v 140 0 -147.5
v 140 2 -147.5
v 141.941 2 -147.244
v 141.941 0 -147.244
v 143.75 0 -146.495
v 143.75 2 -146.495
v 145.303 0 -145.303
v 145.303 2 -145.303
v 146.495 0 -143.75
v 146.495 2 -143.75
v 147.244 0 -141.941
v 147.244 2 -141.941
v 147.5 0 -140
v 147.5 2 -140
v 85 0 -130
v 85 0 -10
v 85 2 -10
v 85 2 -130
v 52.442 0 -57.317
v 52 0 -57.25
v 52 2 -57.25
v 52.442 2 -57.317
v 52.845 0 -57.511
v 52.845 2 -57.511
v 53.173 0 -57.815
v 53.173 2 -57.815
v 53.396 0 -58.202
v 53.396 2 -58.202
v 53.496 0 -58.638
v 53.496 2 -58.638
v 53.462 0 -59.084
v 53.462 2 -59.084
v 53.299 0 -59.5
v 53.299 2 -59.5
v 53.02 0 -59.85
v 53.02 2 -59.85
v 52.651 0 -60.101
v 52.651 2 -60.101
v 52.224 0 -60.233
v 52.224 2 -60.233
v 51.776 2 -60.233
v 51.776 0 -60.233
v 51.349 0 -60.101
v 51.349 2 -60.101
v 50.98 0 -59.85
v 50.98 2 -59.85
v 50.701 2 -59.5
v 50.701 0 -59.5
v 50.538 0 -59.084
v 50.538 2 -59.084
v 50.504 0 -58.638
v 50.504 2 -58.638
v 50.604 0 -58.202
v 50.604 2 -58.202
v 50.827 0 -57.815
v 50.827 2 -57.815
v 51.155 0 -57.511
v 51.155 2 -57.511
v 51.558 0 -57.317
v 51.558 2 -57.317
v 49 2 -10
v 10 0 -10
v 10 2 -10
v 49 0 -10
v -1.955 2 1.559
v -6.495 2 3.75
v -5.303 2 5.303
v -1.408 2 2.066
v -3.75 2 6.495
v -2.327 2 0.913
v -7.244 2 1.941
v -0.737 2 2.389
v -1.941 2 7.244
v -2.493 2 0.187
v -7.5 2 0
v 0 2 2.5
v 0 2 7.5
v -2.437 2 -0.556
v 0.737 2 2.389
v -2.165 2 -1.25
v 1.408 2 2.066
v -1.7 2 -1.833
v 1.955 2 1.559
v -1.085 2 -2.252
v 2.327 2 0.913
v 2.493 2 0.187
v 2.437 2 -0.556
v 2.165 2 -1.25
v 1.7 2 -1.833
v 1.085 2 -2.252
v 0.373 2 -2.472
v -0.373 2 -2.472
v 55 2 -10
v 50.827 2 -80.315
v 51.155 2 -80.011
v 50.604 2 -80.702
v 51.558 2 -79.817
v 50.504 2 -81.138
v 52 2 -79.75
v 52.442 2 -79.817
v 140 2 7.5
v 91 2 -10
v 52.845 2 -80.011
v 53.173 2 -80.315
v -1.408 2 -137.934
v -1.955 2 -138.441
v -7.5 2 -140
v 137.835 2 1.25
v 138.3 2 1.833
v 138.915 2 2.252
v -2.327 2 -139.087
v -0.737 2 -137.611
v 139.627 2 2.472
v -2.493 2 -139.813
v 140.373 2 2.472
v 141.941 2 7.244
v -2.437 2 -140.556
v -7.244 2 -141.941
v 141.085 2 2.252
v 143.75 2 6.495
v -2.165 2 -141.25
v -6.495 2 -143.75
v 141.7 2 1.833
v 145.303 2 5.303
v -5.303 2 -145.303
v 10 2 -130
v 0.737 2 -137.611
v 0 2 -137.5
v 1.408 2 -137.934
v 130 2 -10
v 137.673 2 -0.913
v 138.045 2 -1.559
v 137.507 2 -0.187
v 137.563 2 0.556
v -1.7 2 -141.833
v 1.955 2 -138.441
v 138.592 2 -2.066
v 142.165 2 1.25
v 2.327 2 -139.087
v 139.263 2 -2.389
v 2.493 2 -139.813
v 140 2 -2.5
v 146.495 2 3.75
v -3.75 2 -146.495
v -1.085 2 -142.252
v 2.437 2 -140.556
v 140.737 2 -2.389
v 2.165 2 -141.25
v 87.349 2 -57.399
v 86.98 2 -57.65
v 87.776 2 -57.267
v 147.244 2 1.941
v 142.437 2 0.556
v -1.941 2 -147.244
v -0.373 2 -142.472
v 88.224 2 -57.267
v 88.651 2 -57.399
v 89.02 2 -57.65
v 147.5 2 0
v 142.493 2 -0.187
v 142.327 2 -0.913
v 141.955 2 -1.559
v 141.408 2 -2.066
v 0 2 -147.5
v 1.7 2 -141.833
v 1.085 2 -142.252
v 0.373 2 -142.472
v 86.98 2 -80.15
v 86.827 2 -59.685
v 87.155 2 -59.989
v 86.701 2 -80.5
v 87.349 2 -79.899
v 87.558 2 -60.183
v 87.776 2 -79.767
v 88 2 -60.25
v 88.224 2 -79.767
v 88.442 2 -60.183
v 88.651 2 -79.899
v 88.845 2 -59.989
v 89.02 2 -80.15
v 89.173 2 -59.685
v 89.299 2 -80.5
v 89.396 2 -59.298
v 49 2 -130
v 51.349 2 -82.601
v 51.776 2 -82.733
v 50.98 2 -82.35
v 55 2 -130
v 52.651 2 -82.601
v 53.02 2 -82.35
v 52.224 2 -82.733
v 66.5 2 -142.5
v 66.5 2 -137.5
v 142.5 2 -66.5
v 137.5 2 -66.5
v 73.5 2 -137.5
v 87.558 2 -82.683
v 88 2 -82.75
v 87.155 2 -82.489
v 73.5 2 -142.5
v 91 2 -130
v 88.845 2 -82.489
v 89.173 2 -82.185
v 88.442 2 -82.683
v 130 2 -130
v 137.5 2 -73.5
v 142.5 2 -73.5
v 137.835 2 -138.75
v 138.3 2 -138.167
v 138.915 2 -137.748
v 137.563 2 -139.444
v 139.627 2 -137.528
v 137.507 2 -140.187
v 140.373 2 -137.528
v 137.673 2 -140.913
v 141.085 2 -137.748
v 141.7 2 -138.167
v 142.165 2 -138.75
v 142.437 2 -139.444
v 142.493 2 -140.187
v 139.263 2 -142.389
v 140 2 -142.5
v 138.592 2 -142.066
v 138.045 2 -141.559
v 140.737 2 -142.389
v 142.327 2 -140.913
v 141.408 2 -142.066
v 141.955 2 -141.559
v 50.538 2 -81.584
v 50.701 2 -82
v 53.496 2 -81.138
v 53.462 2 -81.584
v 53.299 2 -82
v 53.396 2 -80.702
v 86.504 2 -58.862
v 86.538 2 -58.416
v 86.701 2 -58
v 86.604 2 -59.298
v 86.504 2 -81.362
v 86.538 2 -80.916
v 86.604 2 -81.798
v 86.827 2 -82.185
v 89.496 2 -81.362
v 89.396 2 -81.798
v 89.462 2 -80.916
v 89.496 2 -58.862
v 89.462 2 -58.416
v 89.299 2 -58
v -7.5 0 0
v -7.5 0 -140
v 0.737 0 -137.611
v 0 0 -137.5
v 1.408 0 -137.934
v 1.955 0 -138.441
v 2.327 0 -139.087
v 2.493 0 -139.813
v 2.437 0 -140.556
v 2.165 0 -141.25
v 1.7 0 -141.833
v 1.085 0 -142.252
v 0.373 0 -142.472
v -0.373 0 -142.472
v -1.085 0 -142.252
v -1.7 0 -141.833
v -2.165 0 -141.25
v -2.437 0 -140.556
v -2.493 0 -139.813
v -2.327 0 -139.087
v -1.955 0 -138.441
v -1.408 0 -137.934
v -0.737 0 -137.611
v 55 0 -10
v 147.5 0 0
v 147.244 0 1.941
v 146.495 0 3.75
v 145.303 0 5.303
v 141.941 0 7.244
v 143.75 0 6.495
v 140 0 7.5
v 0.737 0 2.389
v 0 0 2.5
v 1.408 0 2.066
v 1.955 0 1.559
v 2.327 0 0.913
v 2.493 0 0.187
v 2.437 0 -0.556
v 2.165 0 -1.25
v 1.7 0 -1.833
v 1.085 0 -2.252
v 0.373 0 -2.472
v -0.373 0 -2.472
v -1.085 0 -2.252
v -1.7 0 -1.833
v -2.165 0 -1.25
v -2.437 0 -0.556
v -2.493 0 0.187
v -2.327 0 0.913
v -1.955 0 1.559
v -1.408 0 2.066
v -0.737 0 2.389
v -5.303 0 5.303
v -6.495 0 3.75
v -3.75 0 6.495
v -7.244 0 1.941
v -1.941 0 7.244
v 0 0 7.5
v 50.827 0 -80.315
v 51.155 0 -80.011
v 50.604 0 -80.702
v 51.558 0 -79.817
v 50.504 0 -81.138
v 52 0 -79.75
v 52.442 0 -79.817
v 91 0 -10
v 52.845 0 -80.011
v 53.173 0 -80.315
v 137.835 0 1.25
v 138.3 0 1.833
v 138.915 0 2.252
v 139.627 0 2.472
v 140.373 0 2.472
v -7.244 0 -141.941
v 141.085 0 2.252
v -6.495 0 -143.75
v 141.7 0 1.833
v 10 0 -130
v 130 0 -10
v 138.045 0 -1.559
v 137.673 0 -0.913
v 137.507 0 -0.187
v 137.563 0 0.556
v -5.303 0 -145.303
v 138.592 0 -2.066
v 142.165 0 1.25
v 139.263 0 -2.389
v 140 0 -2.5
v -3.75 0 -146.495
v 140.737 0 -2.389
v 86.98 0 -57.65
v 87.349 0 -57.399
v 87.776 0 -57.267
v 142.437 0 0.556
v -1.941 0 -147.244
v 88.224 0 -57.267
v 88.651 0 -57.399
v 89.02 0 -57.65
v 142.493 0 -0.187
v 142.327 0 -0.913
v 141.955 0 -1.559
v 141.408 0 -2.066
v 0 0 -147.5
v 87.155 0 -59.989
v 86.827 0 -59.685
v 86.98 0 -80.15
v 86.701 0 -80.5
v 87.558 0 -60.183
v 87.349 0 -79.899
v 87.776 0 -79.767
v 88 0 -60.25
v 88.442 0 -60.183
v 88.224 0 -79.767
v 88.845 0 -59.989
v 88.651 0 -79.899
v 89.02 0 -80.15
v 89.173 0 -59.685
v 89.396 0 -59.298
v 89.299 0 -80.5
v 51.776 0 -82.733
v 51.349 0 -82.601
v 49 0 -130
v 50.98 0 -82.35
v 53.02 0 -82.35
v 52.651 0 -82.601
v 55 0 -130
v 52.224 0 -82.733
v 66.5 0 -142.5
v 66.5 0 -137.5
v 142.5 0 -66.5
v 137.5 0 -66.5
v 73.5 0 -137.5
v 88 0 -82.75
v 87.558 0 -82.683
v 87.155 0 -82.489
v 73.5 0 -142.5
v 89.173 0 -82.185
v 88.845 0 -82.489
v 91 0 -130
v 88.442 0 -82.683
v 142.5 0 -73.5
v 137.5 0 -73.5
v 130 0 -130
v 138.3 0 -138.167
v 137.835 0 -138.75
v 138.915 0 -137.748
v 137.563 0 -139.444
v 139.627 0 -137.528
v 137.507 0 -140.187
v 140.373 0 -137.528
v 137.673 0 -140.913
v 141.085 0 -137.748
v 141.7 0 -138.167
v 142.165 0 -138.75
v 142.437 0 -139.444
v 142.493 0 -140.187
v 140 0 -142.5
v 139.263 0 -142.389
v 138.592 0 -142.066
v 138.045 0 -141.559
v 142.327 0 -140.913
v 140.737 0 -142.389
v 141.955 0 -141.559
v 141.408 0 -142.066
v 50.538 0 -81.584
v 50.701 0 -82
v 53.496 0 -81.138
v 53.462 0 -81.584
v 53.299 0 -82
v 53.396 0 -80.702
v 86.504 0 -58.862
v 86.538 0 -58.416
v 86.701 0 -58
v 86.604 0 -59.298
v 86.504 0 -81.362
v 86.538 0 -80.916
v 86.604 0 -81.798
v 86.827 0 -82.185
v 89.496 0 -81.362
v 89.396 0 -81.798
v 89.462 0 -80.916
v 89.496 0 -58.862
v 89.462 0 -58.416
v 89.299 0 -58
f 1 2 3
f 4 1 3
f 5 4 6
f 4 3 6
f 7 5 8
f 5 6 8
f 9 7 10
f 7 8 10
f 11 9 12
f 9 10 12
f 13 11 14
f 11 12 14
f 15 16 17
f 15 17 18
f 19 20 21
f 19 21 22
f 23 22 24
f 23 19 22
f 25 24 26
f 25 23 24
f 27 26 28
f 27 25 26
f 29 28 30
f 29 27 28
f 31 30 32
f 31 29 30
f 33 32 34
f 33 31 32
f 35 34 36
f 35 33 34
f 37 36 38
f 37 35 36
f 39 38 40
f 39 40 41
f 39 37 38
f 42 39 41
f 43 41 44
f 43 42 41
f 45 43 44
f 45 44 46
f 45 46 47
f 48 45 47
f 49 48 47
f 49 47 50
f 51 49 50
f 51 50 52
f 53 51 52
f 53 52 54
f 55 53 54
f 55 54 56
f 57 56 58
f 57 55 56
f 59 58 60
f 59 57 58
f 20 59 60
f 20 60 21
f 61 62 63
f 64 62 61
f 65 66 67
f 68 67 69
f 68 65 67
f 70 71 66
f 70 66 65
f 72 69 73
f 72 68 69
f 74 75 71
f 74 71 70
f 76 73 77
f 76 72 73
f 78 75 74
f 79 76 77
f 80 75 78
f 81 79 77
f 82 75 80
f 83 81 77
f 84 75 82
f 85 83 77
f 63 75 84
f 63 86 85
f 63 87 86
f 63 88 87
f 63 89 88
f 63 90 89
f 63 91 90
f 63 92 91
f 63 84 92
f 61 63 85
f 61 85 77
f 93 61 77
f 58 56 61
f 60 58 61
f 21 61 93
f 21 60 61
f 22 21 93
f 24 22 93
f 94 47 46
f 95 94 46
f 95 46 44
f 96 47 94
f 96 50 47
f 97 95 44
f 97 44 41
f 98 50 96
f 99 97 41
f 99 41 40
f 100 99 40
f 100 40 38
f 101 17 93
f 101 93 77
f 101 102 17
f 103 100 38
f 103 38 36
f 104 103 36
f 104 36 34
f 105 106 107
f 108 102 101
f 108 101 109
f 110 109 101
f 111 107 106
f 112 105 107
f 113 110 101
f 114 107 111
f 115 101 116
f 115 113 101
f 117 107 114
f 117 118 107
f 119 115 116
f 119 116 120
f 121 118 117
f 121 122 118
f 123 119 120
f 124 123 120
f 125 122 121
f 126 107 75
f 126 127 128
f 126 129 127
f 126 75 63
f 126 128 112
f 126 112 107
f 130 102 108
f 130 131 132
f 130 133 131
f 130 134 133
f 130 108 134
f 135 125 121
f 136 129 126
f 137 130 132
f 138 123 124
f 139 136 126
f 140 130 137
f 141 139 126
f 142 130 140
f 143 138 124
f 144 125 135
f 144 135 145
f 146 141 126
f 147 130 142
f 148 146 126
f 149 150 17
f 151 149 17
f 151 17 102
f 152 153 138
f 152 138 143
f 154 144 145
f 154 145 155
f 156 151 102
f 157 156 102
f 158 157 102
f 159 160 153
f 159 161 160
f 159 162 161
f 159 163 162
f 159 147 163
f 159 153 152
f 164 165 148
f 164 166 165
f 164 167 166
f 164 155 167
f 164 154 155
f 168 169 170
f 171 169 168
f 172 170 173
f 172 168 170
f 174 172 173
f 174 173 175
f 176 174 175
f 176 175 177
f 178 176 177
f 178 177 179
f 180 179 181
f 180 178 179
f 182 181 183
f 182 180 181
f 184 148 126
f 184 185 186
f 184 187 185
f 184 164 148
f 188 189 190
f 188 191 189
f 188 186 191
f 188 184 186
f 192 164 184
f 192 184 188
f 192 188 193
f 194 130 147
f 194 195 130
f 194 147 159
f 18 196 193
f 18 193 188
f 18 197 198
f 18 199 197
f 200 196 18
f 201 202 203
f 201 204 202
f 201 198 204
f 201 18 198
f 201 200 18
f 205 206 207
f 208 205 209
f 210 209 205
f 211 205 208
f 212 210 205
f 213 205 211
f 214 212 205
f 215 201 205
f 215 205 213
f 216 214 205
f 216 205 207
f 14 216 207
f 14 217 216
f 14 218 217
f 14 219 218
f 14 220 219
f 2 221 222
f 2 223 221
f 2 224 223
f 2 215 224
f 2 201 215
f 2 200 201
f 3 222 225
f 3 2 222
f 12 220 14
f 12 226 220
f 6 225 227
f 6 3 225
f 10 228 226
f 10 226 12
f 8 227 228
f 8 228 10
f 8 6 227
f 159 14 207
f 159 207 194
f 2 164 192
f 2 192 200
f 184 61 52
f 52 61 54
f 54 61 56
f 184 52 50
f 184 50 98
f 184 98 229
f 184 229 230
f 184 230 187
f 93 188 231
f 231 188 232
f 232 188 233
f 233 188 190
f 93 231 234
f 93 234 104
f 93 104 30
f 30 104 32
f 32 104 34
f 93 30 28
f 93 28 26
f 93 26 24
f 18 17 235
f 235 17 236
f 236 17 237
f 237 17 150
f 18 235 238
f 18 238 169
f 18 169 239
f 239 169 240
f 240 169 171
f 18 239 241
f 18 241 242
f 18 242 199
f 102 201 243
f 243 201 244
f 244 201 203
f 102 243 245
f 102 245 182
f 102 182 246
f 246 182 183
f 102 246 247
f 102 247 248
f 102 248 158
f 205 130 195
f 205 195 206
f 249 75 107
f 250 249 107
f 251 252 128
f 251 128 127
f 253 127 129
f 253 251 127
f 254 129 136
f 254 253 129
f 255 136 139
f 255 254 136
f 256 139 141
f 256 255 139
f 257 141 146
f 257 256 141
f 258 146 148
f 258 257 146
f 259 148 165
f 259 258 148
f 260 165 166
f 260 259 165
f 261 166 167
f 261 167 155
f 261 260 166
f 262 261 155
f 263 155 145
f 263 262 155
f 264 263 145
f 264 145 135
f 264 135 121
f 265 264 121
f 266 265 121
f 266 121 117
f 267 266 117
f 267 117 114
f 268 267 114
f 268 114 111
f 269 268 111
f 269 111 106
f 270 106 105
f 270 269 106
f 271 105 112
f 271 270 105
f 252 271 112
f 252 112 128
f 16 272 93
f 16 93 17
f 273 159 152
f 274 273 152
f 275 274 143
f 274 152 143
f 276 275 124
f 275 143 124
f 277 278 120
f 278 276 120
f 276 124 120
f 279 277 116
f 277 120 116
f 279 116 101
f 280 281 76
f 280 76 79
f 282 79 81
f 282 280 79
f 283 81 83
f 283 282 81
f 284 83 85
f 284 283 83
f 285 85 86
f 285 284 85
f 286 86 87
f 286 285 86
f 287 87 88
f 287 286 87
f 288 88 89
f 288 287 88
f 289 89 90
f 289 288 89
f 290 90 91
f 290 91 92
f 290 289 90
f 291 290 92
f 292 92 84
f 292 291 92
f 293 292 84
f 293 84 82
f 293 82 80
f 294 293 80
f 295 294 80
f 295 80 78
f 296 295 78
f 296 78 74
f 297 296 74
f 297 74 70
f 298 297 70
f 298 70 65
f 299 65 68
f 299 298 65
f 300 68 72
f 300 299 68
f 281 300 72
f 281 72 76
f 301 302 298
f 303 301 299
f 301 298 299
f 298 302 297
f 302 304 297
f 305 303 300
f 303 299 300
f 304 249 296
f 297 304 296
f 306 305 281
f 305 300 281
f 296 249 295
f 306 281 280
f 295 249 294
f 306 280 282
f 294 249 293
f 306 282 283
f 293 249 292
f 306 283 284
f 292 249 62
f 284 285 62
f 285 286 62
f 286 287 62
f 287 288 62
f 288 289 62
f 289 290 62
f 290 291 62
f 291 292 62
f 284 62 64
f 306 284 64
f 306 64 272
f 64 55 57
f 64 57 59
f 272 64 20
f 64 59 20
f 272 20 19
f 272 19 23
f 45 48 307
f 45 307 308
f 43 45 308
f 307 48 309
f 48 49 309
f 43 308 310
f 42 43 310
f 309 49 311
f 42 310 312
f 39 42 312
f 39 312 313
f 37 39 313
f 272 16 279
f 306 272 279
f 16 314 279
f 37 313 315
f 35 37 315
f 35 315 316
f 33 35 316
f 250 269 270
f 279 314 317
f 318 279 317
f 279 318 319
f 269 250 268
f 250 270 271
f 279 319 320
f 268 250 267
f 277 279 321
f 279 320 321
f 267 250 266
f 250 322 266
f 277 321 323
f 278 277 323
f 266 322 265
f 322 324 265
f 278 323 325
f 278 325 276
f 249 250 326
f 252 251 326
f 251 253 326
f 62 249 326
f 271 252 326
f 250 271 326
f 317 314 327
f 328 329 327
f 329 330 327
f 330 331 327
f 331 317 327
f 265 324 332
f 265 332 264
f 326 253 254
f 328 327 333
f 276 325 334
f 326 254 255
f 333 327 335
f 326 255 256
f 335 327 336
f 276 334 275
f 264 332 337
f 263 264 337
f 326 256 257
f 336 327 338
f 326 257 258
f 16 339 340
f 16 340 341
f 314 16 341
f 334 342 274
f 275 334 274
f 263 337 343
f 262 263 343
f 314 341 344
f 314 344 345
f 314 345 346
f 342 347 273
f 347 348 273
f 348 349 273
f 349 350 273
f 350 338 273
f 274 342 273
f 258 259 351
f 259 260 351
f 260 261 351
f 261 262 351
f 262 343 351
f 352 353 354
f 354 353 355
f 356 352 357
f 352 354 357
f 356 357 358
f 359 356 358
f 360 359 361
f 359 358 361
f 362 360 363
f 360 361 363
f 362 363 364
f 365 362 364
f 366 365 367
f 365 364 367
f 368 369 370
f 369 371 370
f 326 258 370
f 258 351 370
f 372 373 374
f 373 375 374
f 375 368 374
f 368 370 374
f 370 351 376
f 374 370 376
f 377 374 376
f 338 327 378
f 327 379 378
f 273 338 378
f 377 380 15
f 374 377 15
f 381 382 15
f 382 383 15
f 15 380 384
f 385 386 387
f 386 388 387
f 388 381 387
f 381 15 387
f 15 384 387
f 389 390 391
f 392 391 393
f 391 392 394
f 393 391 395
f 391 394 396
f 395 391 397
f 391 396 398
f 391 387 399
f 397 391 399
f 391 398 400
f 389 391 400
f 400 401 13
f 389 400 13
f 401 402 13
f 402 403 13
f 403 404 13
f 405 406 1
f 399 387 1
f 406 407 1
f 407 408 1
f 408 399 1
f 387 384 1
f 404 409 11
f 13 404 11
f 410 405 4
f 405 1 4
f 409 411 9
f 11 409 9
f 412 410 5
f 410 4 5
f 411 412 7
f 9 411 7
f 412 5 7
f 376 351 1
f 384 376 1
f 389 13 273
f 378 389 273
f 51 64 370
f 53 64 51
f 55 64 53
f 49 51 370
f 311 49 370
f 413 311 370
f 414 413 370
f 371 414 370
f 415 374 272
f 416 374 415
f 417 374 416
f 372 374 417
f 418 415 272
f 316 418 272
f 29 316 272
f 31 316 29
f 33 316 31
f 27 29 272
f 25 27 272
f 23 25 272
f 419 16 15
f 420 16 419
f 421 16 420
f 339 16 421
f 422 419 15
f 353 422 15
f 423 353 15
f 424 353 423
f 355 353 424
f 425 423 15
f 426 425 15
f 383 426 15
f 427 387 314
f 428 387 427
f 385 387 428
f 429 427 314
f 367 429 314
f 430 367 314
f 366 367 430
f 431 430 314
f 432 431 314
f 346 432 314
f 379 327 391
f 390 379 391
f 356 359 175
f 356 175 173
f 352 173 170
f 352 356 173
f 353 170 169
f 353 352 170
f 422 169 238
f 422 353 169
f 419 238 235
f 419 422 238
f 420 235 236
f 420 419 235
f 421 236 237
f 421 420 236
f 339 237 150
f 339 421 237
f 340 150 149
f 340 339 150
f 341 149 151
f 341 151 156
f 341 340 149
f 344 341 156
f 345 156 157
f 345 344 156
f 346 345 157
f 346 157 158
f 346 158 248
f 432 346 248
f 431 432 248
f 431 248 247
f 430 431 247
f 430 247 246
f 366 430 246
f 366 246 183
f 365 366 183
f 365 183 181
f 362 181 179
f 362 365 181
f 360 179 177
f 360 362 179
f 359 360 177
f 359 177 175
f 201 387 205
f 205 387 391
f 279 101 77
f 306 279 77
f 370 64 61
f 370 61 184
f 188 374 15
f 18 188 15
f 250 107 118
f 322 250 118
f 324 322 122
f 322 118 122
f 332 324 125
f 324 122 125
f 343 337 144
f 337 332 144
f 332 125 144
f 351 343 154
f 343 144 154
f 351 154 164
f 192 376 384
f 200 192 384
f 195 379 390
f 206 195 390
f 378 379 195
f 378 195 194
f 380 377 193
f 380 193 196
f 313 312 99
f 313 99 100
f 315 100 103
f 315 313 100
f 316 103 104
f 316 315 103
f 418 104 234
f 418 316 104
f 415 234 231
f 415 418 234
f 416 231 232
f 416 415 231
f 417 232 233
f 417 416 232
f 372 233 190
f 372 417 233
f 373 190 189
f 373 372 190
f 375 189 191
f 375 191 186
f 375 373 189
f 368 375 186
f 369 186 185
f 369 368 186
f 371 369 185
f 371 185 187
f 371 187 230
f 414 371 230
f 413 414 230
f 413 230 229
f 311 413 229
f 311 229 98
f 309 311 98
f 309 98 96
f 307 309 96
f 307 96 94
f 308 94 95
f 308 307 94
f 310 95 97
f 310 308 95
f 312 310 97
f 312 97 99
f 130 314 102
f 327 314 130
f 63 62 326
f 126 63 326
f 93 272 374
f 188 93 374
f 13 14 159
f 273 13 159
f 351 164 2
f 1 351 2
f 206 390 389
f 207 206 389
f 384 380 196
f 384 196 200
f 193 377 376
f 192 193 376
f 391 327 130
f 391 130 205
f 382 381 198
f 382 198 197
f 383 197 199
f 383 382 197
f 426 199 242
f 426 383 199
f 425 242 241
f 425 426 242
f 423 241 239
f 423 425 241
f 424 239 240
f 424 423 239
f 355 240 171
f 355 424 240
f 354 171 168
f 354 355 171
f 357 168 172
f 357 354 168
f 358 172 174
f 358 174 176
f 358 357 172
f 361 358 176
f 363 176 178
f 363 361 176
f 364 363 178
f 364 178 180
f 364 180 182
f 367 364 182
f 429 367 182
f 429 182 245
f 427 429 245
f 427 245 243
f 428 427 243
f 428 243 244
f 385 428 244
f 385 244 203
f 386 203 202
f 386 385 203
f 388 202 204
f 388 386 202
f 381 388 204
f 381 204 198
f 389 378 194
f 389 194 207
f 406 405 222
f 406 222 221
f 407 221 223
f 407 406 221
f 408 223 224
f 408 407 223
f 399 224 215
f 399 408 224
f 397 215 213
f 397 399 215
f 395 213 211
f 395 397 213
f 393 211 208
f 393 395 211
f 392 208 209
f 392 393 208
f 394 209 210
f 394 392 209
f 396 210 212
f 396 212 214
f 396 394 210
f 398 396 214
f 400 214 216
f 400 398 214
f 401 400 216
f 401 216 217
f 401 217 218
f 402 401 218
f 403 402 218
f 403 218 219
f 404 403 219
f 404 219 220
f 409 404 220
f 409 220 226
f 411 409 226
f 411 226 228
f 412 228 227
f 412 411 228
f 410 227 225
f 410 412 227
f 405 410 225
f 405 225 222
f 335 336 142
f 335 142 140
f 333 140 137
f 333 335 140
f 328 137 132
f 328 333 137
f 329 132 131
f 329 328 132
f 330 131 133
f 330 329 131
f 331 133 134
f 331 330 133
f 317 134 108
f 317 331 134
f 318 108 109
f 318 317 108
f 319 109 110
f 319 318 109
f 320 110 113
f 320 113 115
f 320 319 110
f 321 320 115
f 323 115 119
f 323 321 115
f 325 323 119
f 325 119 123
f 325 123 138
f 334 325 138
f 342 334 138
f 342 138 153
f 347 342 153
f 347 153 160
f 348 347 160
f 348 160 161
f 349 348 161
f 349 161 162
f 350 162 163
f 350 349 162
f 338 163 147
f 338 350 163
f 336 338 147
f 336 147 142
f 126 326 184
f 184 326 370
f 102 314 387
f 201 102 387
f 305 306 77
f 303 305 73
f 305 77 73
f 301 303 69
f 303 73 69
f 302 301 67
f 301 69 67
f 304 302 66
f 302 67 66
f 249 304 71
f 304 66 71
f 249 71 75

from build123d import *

# Parameters (mm, degrees)
CROQUIS1_W              = 160
CROQUIS1_H              = 160
CROQUIS1_R              = 1.5
CROQUIS1_R_2            = 2.5
CROQUIS1_W_2            = 39
CROQUIS1_H_2            = 120
CROQUIS1_W_3            = 30
CROQUIS1_W_4            = 5
CROQUIS1_H_3            = 7
CROQUIS1_W_5            = 7
CROQUIS1_H_4            = 5
SALIENTE_EXTRUIR1_DEPTH = 2
CROQUIS2_W              = 160
CROQUIS2_H              = 160
CORTAR_EXTRUIR1_DEPTH   = 10


with BuildPart() as part:
    # Croquis1 → Saliente-Extruir1 (new body)
    with BuildSketch(Plane(origin=(0, 0, 0), x_dir=(1, 0, 0), z_dir=(0, 1, 0))):
        with Locations((70, 70)):
            Rectangle(CROQUIS1_W, CROQUIS1_H)
        with Locations(Location((52, 81.25, 0), (0, 0, 270))):
            Circle(CROQUIS1_R, mode=Mode.SUBTRACT)
        with Locations(Location((52, 58.75, 0), (0, 0, 270))):
            Circle(CROQUIS1_R, mode=Mode.SUBTRACT)
        with Locations(Location((0, 140, 0), (0, 0, 270))):
            Circle(CROQUIS1_R_2, mode=Mode.SUBTRACT)
        with Locations(Location((0, 0, 0), (0, 0, 270))):
            Circle(CROQUIS1_R_2, mode=Mode.SUBTRACT)
        with Locations(Location((88, 81.25, 0), (0, 0, 90))):
            Circle(CROQUIS1_R, mode=Mode.SUBTRACT)
        with Locations(Location((88, 58.75, 0), (0, 0, 90))):
            Circle(CROQUIS1_R, mode=Mode.SUBTRACT)
        with Locations(Location((140, 0, 0), (0, 0, 90))):
            Circle(CROQUIS1_R_2, mode=Mode.SUBTRACT)
        with Locations(Location((140, 140, 0), (0, 0, 90))):
            Circle(CROQUIS1_R_2, mode=Mode.SUBTRACT)
        with Locations((29.5, 70)):
            Rectangle(CROQUIS1_W_2, CROQUIS1_H_2, mode=Mode.SUBTRACT)
        with Locations((110.5, 70)):
            Rectangle(CROQUIS1_W_2, CROQUIS1_H_2, mode=Mode.SUBTRACT)
        with Locations((70, 70)):
            Rectangle(CROQUIS1_W_3, CROQUIS1_H_2, mode=Mode.SUBTRACT)
        with Locations((140, 70)):
            Rectangle(CROQUIS1_W_4, CROQUIS1_H_3, mode=Mode.SUBTRACT)
        with Locations((70, 140)):
            Rectangle(CROQUIS1_W_5, CROQUIS1_H_4, mode=Mode.SUBTRACT)
    extrude(amount=SALIENTE_EXTRUIR1_DEPTH)

    # Croquis2 → Cortar-Extruir1 (cut)
    with BuildSketch(Plane(origin=(0, 2, 0), x_dir=(1, 0, 0), z_dir=(0, 1, 0))):
        with Locations((70, 70)):
            Rectangle(CROQUIS2_W, CROQUIS2_H)
        with BuildLine():
            Line((0, 147.5), (140, 147.5))
            ThreePointArc((140, 147.5), (145.303300859, 145.303300859), (147.5, 140))
            Line((147.5, 140), (147.5, 0))
            ThreePointArc((147.5, 0), (145.303300859, -5.303300859), (140, -7.5))
            Line((140, -7.5), (0, -7.5))
            ThreePointArc((0, -7.5), (-5.303300859, -5.303300859), (-7.5, 0))
            Line((-7.5, 0), (-7.5, 140))
            ThreePointArc((-7.5, 140), (-5.303300859, 145.303300859), (0, 147.5))
        make_face(mode=Mode.SUBTRACT)
    extrude(amount=-CORTAR_EXTRUIR1_DEPTH, mode=Mode.SUBTRACT)


solid = part.part
